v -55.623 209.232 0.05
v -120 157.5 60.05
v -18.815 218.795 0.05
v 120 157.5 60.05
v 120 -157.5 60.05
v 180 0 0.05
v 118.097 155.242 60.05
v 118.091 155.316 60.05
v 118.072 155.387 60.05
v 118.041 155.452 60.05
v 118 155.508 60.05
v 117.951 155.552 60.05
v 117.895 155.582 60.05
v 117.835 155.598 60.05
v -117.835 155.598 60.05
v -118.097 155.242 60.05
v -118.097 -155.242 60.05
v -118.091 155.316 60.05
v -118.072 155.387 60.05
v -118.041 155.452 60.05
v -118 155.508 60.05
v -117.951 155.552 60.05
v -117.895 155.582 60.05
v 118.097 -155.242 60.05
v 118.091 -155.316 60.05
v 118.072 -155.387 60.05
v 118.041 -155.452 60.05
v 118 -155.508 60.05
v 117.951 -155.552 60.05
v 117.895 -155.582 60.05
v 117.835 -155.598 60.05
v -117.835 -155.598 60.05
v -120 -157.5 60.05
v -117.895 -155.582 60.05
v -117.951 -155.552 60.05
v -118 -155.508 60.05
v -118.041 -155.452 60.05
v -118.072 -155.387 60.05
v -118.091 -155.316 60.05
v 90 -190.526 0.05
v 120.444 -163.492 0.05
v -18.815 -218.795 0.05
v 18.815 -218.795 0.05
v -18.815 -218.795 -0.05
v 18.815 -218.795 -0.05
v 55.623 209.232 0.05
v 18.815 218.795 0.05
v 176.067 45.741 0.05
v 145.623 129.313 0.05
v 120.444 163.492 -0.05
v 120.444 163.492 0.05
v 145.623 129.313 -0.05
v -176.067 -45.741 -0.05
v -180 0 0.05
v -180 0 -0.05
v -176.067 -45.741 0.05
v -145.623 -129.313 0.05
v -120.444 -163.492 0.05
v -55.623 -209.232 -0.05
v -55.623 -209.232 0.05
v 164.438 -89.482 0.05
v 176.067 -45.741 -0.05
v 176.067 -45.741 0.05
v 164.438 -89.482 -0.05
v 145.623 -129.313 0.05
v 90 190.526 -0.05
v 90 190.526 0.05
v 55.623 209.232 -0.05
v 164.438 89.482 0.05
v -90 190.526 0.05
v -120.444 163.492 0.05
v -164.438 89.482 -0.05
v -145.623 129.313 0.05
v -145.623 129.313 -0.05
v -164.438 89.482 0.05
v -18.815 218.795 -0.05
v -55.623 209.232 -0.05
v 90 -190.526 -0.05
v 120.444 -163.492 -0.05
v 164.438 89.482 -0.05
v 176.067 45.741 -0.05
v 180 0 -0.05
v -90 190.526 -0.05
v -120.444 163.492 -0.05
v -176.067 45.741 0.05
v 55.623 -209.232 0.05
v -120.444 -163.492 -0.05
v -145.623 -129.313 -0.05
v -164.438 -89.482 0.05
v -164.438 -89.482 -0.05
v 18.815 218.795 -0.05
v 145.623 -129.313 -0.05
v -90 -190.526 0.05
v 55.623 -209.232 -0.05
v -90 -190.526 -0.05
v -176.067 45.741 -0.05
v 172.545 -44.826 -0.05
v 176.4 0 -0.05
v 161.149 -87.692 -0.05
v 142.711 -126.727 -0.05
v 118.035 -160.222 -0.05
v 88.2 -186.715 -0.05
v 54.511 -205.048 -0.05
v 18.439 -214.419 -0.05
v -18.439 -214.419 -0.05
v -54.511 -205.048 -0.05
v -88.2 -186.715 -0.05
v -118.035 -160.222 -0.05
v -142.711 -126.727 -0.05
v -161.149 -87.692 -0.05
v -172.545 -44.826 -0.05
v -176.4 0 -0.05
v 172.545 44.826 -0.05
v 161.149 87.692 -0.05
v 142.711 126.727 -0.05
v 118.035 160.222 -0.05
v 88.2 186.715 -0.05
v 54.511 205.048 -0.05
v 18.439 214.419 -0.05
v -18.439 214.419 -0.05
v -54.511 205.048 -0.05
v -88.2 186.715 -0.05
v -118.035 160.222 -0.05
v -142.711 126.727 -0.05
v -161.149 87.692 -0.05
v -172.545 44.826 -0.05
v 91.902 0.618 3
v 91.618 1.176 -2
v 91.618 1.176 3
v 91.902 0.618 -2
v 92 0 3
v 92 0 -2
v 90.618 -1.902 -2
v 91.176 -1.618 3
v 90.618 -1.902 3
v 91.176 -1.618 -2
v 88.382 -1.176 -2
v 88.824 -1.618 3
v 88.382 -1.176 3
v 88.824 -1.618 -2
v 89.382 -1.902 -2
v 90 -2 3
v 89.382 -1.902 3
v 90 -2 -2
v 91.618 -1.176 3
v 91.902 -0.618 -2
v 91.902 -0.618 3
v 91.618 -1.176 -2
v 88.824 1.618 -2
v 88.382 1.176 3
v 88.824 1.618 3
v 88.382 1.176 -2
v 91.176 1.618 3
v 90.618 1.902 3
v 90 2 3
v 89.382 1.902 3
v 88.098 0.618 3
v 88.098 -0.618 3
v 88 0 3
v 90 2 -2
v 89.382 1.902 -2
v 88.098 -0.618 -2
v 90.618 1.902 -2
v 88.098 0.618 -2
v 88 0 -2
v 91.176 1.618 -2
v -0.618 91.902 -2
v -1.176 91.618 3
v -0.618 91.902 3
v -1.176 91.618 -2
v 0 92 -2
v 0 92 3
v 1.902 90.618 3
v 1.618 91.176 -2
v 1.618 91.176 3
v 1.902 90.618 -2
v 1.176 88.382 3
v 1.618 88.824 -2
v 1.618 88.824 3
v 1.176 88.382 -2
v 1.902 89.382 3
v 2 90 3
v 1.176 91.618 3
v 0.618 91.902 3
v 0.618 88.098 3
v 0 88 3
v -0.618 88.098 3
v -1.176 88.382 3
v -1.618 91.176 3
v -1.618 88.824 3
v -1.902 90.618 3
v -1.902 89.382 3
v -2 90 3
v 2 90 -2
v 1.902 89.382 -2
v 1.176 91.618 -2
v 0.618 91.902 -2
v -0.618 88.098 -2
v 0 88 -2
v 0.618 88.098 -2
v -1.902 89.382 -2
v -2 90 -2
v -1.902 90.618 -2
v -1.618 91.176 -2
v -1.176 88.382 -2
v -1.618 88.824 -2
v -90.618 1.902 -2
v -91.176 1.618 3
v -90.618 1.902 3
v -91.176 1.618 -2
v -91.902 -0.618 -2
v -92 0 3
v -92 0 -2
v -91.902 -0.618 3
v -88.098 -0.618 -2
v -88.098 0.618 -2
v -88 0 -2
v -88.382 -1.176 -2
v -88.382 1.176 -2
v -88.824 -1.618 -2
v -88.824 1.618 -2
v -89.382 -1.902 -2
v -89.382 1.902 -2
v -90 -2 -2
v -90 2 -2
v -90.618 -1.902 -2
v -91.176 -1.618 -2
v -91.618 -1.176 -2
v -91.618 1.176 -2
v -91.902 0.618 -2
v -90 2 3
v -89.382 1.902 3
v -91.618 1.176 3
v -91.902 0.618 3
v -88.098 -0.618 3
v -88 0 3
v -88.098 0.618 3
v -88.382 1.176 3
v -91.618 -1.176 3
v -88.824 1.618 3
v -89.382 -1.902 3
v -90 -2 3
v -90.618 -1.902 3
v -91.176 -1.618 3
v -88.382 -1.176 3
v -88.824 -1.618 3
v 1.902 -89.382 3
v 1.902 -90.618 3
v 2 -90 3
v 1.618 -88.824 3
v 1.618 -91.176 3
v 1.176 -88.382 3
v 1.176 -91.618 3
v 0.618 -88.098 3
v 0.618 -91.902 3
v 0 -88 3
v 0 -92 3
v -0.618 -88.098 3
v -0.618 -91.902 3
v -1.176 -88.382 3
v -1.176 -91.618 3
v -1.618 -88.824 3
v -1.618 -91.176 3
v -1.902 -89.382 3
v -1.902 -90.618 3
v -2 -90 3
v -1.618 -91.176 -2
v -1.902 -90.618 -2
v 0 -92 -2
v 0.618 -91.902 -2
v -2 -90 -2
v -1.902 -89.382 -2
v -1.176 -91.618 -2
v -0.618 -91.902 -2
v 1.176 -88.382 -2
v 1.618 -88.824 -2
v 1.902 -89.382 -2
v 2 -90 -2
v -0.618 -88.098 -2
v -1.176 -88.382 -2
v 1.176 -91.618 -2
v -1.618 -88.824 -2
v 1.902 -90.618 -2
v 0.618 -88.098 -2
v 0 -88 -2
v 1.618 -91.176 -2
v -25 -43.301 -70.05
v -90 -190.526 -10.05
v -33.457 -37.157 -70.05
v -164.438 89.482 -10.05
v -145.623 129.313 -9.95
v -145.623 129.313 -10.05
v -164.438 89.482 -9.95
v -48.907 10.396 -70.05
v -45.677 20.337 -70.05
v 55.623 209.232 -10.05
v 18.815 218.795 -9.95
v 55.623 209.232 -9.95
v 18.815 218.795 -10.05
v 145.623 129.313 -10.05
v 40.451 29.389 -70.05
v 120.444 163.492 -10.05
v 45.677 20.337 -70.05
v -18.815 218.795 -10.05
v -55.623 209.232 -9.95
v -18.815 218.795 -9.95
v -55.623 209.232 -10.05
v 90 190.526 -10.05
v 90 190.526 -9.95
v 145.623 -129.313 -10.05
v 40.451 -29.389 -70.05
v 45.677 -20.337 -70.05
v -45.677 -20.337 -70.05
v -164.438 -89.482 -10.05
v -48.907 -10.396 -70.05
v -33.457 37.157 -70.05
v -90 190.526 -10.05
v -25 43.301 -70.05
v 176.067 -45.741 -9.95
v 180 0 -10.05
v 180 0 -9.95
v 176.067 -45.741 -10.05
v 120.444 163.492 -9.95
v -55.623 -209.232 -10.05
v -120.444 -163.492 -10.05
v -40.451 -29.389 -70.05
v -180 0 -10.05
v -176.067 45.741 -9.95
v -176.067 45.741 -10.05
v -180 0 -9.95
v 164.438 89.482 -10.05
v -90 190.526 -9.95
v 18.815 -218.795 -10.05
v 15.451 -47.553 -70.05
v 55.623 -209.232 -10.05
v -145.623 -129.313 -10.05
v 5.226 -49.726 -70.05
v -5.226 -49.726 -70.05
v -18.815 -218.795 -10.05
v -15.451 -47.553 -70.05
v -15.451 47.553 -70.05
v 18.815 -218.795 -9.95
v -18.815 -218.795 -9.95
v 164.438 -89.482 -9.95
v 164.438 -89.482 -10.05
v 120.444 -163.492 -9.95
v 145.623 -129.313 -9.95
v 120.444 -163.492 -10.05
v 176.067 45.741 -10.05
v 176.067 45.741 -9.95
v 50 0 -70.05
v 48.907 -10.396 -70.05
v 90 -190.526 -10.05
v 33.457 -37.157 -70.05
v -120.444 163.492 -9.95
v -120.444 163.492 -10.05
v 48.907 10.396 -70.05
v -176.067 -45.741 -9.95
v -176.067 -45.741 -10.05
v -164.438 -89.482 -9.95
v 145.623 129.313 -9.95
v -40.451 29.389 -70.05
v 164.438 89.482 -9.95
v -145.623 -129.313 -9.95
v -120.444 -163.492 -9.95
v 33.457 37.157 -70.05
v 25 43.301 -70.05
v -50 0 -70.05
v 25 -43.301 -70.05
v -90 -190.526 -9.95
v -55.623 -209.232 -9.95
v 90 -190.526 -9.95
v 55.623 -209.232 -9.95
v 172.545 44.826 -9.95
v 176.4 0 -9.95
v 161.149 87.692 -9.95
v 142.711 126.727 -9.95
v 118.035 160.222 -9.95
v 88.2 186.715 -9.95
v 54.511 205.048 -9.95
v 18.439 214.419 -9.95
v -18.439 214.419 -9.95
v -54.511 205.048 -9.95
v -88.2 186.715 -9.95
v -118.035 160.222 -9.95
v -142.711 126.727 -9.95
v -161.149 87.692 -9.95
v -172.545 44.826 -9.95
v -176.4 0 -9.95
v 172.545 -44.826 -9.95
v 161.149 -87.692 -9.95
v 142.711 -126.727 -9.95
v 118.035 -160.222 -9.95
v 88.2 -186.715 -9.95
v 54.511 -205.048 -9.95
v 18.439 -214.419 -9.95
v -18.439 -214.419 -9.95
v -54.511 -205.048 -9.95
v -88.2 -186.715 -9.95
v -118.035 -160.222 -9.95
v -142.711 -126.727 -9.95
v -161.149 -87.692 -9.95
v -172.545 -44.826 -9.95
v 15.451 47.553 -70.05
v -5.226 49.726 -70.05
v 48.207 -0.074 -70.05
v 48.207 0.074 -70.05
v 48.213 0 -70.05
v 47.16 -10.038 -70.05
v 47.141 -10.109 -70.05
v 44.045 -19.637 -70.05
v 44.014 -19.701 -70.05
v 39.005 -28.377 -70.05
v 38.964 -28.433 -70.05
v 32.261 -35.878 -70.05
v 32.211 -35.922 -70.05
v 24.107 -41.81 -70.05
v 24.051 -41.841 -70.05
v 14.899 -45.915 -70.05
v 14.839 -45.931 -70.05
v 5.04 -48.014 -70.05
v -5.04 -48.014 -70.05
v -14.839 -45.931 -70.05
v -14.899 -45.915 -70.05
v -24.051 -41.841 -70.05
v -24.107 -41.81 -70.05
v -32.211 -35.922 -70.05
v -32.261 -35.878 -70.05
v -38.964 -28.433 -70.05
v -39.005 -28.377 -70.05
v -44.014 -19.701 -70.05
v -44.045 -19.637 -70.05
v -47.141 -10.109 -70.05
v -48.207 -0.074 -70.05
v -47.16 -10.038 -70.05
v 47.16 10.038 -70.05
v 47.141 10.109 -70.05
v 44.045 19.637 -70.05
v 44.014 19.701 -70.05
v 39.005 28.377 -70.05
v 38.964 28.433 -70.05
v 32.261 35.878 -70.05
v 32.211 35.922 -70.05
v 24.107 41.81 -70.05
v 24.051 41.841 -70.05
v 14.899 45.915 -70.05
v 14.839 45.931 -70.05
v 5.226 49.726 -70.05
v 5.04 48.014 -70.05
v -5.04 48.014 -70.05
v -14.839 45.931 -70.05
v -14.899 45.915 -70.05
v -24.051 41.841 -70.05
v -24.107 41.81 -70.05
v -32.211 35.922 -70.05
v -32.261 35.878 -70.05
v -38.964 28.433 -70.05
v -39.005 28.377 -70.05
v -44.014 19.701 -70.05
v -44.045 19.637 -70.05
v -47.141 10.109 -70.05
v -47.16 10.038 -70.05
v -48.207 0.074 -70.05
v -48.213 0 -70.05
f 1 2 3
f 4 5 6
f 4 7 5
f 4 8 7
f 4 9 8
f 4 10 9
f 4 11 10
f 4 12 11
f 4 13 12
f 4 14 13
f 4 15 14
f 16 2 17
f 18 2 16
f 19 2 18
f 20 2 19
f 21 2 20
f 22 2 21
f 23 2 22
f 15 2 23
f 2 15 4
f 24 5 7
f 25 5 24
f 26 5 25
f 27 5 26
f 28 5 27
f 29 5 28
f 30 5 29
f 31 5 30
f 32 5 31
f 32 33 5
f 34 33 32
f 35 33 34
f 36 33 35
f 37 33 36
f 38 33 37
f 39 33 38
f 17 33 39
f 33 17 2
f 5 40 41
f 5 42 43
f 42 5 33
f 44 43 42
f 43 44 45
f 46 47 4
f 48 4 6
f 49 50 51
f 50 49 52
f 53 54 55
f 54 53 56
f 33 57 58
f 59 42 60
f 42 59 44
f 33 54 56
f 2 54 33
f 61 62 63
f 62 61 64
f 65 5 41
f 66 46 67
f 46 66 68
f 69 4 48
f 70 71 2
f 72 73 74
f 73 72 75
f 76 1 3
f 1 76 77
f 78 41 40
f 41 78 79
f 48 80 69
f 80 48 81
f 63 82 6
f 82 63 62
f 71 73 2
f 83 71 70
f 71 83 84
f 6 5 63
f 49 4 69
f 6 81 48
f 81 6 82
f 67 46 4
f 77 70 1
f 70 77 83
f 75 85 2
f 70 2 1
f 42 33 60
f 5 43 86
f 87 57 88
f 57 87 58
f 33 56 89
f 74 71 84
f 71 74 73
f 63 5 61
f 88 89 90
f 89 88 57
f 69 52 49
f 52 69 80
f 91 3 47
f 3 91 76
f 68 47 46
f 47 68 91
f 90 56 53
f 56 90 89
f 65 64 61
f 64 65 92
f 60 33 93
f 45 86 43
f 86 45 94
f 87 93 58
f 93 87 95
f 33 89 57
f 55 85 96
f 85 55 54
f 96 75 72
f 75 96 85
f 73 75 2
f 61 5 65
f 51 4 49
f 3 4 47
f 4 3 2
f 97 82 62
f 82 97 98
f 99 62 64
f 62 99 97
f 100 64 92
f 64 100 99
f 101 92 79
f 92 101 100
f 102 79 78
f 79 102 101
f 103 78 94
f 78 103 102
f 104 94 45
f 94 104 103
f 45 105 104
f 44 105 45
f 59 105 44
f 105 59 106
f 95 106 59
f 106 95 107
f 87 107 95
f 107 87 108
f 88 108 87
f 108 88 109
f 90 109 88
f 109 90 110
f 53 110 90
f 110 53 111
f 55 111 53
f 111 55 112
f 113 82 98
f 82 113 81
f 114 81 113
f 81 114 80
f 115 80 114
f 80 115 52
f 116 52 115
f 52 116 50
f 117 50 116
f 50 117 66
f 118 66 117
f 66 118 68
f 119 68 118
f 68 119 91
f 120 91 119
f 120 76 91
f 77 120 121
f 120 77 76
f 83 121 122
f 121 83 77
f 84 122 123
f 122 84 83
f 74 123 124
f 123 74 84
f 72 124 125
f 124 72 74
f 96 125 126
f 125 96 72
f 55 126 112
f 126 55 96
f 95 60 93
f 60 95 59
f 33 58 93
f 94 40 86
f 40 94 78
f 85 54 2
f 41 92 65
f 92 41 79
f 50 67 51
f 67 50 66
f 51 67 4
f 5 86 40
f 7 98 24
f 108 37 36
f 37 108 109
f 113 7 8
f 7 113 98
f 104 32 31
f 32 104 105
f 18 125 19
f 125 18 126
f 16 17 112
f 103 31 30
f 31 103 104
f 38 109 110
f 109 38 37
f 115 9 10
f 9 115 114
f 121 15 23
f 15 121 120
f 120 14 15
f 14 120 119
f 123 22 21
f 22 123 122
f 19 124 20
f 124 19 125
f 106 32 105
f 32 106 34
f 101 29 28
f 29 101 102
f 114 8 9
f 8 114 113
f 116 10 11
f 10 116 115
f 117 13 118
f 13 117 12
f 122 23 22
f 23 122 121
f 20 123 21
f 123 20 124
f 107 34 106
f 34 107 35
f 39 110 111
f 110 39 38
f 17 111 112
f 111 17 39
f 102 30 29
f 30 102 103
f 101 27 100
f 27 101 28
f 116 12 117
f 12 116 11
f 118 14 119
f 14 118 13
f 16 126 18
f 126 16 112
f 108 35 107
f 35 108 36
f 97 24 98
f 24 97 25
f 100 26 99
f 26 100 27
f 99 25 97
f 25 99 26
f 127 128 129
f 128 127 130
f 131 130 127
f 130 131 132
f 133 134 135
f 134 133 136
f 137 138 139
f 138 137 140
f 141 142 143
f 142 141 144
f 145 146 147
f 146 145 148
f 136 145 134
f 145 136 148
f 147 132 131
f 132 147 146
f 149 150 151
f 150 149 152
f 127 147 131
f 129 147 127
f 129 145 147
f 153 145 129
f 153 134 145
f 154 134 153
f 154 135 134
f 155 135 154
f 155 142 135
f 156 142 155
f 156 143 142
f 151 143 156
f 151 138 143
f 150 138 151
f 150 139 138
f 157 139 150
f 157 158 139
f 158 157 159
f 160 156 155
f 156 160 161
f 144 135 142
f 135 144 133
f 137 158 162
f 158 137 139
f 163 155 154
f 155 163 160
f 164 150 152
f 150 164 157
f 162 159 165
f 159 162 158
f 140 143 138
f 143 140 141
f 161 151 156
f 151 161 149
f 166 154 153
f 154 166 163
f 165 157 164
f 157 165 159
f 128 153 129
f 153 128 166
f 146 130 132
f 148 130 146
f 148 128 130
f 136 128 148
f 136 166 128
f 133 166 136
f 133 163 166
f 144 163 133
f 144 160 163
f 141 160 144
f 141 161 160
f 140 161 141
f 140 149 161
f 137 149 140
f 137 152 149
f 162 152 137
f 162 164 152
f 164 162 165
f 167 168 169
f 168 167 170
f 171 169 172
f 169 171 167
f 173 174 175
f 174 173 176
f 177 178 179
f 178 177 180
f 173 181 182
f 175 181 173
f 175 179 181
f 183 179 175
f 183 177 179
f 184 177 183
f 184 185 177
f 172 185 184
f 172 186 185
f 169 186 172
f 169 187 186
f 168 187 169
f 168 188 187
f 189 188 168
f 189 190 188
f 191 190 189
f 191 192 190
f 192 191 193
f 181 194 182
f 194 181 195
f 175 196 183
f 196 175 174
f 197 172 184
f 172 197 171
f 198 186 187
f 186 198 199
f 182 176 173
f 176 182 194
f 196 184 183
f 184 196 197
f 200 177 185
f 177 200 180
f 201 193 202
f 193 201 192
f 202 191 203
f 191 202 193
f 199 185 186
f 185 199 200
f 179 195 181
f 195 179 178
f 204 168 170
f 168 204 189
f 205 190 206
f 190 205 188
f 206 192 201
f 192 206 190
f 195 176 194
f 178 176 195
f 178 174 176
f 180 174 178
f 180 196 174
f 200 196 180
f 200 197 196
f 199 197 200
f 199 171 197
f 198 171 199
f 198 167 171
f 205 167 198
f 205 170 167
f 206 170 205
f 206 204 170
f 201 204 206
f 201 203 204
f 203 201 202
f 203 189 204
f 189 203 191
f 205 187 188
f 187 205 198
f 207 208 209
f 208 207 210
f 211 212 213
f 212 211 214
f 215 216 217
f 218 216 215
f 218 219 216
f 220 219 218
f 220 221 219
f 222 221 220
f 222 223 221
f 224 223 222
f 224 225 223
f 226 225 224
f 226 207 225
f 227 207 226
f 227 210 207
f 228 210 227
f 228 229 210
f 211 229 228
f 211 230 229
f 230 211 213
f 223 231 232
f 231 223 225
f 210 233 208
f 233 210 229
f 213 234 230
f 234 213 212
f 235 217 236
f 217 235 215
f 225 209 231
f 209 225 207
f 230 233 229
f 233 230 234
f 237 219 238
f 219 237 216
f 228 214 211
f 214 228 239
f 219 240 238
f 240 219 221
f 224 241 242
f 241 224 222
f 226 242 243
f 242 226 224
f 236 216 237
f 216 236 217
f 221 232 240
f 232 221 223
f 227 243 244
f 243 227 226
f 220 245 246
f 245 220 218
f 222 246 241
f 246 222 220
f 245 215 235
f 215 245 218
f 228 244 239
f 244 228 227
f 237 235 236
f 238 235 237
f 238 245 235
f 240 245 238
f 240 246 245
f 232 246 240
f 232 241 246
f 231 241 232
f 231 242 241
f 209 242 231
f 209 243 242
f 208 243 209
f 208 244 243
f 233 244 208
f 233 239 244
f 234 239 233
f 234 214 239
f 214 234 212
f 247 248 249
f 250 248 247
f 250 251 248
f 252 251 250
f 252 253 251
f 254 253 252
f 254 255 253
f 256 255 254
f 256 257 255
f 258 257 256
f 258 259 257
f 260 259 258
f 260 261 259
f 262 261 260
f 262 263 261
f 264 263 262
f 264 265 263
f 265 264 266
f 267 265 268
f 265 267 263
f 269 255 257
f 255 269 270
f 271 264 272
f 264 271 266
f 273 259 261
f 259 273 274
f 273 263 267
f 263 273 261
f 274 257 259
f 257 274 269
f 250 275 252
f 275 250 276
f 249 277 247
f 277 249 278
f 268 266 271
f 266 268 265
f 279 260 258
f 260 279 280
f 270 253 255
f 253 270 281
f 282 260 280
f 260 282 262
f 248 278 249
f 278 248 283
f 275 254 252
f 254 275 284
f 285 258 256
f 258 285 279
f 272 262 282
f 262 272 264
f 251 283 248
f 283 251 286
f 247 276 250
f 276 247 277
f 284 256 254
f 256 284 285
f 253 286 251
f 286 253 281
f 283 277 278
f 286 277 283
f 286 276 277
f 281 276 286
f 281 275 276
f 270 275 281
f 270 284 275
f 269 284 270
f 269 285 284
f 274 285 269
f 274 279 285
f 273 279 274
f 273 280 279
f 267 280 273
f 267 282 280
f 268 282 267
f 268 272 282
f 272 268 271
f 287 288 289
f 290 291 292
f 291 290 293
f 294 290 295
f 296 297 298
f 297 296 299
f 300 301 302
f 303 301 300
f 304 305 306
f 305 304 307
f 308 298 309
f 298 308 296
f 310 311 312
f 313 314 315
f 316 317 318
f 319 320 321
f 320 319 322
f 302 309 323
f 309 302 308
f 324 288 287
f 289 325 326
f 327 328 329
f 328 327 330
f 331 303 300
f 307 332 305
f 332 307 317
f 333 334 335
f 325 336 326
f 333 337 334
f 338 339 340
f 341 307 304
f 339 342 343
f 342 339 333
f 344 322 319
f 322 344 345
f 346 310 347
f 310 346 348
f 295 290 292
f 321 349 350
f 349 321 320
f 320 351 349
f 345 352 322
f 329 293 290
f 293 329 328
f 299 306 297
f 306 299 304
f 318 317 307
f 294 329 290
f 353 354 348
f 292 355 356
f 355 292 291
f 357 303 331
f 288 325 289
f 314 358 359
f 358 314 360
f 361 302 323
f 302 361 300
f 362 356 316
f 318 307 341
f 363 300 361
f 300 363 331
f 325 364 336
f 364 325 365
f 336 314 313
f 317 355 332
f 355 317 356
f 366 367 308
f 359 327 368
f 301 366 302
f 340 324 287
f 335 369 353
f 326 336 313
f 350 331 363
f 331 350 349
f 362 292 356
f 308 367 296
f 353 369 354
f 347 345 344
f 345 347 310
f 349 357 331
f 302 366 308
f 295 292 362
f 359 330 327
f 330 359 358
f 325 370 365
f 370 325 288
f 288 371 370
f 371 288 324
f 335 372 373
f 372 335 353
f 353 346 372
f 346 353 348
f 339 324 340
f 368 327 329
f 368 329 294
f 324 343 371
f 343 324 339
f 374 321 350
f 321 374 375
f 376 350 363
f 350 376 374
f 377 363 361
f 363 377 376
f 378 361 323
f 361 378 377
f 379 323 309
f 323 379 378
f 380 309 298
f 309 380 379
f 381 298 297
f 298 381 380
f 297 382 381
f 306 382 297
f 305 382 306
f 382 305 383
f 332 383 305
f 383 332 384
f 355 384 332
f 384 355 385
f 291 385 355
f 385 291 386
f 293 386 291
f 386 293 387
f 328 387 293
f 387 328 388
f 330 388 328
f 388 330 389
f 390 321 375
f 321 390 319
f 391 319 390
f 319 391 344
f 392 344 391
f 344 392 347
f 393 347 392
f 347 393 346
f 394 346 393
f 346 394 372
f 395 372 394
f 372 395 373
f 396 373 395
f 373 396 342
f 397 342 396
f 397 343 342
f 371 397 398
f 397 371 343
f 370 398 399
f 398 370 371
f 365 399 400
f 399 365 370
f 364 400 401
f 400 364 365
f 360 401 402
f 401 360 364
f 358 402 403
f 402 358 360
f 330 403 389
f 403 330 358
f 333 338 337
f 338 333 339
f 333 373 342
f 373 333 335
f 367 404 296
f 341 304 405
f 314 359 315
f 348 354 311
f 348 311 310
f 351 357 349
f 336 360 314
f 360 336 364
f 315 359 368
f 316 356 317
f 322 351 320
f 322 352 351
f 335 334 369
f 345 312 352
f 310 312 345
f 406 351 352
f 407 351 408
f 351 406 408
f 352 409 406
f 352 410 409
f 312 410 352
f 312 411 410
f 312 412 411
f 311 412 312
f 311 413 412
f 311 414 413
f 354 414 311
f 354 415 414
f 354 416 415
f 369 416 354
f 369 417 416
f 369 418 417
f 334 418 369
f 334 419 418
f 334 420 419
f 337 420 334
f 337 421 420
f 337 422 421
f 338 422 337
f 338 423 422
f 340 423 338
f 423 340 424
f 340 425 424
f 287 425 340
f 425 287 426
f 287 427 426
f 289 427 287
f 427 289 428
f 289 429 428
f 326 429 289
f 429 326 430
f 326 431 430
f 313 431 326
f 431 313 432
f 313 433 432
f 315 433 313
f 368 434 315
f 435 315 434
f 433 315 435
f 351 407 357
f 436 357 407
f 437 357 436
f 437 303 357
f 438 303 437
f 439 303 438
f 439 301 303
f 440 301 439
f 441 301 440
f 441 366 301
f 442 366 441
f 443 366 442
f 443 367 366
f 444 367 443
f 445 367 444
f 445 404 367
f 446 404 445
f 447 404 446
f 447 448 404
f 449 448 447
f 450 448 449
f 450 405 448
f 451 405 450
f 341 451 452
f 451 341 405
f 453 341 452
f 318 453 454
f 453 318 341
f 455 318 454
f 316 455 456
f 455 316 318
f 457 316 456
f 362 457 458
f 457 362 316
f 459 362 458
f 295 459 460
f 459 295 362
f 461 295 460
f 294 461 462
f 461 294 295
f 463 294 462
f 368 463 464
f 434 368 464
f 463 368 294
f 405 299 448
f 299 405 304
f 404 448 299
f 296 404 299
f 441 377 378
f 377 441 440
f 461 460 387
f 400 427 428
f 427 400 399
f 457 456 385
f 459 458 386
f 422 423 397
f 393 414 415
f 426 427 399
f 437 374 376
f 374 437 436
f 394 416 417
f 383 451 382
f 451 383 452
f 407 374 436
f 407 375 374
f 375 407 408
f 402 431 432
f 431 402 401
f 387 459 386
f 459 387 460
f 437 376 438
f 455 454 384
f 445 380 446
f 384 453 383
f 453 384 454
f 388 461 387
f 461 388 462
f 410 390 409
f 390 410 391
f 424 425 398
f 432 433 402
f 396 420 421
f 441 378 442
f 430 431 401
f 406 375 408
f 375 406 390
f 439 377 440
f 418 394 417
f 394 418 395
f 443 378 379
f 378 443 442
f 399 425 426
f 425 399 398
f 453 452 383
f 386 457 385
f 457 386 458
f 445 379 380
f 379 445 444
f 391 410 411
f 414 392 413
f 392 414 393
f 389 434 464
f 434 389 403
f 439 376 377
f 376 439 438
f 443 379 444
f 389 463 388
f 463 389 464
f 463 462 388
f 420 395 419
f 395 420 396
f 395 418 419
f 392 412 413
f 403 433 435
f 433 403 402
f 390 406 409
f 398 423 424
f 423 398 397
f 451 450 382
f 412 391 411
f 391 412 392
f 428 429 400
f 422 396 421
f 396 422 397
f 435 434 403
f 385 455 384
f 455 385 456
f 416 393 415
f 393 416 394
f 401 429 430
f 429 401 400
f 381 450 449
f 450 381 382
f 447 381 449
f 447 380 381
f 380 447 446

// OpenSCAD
// コイン計算機用シュート - 2分割設計
// 上部: 240mm x 315mm → 下部: 直径100mm
// 傾斜角度: 40度
// Bambu Lab A1対応 (256x256x256mm)

// パラメータ
top_width = 240;      // 上部幅 (mm)
top_depth = 315;      // 上部奥行き (mm)
bottom_diameter = 100; // 下部出口直径 (mm)
wall_thickness = 2;    // 壁厚 (mm)
height = 60;          // 各パーツの高さ (mm)
slope_angle = 40;     // 傾斜角度 (度)

// 上部パーツ (Part 1)
module upper_part() {
    difference() {
        // 外側の形状
        hull() {
            // 上部 - 長方形
            translate([0, 0, height])
                cube([top_width, top_depth, 0.1], center=true);

            // 下部 - 楕円形（中間形状）
            translate([0, 0, 0])
                scale([1.8, 2.2, 1])
                cylinder(h=0.1, d=bottom_diameter*2, center=true);
        }

        // 内側をくり抜く
        hull() {
            // 上部内側
            translate([0, 0, height + 0.1])
                cube([top_width - wall_thickness*2, top_depth - wall_thickness*2, 0.1], center=true);

            // 下部内側
            translate([0, 0, -0.1])
                scale([1.8, 2.2, 1])
                cylinder(h=0.1, d=bottom_diameter*2 - wall_thickness*2, center=true);
        }
    }

    // 組み立て用のスナップフィット突起（4箇所）
    for (angle = [0, 90, 180, 270]) {
        rotate([0, 0, angle])
            translate([bottom_diameter*0.9, 0, -2])
                cylinder(h=5, d=4, $fn=20);
    }
}

// 下部パーツ (Part 2)
module lower_part() {
    difference() {
        // 外側の形状
        hull() {
            // 上部 - 楕円形（上部パーツの下部と同じ）
            translate([0, 0, height])
                scale([1.8, 2.2, 1])
                cylinder(h=0.1, d=bottom_diameter*2, center=true);

            // 下部 - 円形（出口）
            translate([0, 0, 0])
                cylinder(h=0.1, d=bottom_diameter, center=true);
        }

        // 内側をくり抜く
        hull() {
            // 上部内側
            translate([0, 0, height + 0.1])
                scale([1.8, 2.2, 1])
                cylinder(h=0.1, d=bottom_diameter*2 - wall_thickness*2, center=true);

            // 下部内側
            translate([0, 0, -0.1])
                cylinder(h=0.1, d=bottom_diameter - wall_thickness*2, center=true);
        }

        // スナップフィット用の穴（4箇所）
        for (angle = [0, 90, 180, 270]) {
            rotate([0, 0, angle])
                translate([bottom_diameter*0.9, 0, height - 3])
                    cylinder(h=6, d=4.2, $fn=20);
        }
    }
}

// レンダリング選択
// "upper" = 上部パーツ, "lower" = 下部パーツ, "both" = 両方表示
part = "both"; // "upper", "lower", "both"

if (part == "upper") {
    upper_part();
} else if (part == "lower") {
    lower_part();
} else if (part == "both") {
    upper_part();
    translate([0, 0, -height - 10])
        lower_part();
}
